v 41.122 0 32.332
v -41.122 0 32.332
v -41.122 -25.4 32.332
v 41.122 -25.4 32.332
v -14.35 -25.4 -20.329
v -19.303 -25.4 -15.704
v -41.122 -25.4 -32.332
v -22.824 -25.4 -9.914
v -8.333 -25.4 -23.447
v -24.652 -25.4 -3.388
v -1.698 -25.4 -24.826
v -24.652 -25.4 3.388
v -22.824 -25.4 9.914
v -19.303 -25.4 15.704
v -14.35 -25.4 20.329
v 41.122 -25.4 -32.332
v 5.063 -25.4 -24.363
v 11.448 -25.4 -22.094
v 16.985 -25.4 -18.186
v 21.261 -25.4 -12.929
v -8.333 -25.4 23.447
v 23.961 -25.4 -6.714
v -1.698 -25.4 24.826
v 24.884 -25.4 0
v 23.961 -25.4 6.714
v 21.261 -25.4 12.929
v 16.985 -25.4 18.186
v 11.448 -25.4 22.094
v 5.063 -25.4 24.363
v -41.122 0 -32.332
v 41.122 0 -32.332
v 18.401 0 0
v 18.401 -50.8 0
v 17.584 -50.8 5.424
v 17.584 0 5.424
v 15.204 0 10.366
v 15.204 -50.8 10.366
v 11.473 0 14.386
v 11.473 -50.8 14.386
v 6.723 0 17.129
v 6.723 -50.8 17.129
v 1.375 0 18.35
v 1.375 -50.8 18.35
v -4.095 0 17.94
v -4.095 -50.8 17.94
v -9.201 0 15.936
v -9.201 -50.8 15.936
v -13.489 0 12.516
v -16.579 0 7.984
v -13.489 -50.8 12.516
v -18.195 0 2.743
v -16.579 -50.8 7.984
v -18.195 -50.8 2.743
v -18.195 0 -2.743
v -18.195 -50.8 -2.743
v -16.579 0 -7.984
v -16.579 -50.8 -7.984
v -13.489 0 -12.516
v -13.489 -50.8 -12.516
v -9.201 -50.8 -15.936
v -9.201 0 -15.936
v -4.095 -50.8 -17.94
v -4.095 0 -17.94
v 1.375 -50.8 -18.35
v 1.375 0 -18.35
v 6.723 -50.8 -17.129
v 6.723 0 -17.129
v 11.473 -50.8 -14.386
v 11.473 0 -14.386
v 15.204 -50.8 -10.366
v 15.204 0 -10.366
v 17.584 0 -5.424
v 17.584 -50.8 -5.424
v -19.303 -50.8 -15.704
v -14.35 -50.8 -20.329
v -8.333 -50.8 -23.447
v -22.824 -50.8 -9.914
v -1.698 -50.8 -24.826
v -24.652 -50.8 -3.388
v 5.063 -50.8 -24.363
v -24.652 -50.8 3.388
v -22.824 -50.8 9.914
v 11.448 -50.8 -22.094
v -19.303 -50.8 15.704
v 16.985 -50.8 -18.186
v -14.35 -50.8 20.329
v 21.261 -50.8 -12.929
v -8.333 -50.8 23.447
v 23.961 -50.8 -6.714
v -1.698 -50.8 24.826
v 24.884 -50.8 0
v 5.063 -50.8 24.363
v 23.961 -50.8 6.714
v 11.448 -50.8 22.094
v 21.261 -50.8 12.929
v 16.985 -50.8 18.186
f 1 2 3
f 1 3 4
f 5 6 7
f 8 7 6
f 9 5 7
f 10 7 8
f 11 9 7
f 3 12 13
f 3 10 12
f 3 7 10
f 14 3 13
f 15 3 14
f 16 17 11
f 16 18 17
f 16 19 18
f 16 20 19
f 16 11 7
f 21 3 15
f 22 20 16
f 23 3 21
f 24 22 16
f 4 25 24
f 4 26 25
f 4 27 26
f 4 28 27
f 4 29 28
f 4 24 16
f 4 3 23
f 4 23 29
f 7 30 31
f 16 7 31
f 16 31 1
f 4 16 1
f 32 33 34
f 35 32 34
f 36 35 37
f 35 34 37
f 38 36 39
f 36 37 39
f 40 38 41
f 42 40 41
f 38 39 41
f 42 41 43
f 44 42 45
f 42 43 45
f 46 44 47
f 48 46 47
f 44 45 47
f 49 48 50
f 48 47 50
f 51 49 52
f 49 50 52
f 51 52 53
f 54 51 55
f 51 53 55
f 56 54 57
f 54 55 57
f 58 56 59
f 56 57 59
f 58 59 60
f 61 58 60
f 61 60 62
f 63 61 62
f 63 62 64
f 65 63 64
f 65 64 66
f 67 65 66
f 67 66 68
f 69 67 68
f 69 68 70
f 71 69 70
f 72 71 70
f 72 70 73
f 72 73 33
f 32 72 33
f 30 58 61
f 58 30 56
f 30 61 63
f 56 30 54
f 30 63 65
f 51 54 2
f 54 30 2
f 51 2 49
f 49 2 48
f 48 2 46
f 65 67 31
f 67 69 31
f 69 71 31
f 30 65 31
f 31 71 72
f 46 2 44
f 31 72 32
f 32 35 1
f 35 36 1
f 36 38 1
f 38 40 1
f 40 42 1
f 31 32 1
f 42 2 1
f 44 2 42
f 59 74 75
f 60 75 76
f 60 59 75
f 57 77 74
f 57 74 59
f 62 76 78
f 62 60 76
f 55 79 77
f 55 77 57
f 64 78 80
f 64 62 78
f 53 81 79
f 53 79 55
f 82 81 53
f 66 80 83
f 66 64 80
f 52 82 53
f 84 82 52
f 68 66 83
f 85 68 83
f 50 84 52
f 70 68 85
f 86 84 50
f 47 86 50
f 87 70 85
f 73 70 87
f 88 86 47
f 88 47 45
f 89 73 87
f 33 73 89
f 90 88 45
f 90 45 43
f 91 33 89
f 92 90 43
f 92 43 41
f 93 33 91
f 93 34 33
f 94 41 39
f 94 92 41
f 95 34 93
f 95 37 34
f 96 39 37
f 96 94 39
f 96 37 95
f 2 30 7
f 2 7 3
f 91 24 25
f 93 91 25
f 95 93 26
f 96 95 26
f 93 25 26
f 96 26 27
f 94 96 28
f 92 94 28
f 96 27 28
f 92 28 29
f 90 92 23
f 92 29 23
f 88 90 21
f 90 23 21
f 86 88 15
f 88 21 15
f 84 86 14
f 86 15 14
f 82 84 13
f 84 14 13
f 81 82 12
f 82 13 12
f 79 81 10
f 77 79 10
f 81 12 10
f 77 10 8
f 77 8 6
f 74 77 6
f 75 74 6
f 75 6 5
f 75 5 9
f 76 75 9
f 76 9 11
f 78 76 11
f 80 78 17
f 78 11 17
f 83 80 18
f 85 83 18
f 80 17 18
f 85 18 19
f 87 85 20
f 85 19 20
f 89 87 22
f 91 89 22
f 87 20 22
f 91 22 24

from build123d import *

# Parameters (mm, degrees)
F0_W     = 82.244918
F0_H     = 64.663574
F1_DEPTH = 25.4
F2_R     = 24.883851
F3_DEPTH = 25.4
F4_R     = 18.401021
F5_DEPTH = 127


with BuildPart() as f1:
    # F0 (on Front) → F1 (new body)
    with BuildSketch(Plane.XZ):
        Rectangle(F0_W, F0_H)
    extrude(amount=F1_DEPTH)

    # F2 (on face) → F3 (join)
    with BuildSketch(Plane.XZ.offset(25.4)):
        Circle(F2_R)
    extrude(amount=F3_DEPTH)

    # F4 (on face) → F5 (cut)
    with BuildSketch(Plane.XZ.offset(50.8)):
        Circle(F4_R)
    extrude(amount=-F5_DEPTH, mode=Mode.SUBTRACT)


solid = f1.part
